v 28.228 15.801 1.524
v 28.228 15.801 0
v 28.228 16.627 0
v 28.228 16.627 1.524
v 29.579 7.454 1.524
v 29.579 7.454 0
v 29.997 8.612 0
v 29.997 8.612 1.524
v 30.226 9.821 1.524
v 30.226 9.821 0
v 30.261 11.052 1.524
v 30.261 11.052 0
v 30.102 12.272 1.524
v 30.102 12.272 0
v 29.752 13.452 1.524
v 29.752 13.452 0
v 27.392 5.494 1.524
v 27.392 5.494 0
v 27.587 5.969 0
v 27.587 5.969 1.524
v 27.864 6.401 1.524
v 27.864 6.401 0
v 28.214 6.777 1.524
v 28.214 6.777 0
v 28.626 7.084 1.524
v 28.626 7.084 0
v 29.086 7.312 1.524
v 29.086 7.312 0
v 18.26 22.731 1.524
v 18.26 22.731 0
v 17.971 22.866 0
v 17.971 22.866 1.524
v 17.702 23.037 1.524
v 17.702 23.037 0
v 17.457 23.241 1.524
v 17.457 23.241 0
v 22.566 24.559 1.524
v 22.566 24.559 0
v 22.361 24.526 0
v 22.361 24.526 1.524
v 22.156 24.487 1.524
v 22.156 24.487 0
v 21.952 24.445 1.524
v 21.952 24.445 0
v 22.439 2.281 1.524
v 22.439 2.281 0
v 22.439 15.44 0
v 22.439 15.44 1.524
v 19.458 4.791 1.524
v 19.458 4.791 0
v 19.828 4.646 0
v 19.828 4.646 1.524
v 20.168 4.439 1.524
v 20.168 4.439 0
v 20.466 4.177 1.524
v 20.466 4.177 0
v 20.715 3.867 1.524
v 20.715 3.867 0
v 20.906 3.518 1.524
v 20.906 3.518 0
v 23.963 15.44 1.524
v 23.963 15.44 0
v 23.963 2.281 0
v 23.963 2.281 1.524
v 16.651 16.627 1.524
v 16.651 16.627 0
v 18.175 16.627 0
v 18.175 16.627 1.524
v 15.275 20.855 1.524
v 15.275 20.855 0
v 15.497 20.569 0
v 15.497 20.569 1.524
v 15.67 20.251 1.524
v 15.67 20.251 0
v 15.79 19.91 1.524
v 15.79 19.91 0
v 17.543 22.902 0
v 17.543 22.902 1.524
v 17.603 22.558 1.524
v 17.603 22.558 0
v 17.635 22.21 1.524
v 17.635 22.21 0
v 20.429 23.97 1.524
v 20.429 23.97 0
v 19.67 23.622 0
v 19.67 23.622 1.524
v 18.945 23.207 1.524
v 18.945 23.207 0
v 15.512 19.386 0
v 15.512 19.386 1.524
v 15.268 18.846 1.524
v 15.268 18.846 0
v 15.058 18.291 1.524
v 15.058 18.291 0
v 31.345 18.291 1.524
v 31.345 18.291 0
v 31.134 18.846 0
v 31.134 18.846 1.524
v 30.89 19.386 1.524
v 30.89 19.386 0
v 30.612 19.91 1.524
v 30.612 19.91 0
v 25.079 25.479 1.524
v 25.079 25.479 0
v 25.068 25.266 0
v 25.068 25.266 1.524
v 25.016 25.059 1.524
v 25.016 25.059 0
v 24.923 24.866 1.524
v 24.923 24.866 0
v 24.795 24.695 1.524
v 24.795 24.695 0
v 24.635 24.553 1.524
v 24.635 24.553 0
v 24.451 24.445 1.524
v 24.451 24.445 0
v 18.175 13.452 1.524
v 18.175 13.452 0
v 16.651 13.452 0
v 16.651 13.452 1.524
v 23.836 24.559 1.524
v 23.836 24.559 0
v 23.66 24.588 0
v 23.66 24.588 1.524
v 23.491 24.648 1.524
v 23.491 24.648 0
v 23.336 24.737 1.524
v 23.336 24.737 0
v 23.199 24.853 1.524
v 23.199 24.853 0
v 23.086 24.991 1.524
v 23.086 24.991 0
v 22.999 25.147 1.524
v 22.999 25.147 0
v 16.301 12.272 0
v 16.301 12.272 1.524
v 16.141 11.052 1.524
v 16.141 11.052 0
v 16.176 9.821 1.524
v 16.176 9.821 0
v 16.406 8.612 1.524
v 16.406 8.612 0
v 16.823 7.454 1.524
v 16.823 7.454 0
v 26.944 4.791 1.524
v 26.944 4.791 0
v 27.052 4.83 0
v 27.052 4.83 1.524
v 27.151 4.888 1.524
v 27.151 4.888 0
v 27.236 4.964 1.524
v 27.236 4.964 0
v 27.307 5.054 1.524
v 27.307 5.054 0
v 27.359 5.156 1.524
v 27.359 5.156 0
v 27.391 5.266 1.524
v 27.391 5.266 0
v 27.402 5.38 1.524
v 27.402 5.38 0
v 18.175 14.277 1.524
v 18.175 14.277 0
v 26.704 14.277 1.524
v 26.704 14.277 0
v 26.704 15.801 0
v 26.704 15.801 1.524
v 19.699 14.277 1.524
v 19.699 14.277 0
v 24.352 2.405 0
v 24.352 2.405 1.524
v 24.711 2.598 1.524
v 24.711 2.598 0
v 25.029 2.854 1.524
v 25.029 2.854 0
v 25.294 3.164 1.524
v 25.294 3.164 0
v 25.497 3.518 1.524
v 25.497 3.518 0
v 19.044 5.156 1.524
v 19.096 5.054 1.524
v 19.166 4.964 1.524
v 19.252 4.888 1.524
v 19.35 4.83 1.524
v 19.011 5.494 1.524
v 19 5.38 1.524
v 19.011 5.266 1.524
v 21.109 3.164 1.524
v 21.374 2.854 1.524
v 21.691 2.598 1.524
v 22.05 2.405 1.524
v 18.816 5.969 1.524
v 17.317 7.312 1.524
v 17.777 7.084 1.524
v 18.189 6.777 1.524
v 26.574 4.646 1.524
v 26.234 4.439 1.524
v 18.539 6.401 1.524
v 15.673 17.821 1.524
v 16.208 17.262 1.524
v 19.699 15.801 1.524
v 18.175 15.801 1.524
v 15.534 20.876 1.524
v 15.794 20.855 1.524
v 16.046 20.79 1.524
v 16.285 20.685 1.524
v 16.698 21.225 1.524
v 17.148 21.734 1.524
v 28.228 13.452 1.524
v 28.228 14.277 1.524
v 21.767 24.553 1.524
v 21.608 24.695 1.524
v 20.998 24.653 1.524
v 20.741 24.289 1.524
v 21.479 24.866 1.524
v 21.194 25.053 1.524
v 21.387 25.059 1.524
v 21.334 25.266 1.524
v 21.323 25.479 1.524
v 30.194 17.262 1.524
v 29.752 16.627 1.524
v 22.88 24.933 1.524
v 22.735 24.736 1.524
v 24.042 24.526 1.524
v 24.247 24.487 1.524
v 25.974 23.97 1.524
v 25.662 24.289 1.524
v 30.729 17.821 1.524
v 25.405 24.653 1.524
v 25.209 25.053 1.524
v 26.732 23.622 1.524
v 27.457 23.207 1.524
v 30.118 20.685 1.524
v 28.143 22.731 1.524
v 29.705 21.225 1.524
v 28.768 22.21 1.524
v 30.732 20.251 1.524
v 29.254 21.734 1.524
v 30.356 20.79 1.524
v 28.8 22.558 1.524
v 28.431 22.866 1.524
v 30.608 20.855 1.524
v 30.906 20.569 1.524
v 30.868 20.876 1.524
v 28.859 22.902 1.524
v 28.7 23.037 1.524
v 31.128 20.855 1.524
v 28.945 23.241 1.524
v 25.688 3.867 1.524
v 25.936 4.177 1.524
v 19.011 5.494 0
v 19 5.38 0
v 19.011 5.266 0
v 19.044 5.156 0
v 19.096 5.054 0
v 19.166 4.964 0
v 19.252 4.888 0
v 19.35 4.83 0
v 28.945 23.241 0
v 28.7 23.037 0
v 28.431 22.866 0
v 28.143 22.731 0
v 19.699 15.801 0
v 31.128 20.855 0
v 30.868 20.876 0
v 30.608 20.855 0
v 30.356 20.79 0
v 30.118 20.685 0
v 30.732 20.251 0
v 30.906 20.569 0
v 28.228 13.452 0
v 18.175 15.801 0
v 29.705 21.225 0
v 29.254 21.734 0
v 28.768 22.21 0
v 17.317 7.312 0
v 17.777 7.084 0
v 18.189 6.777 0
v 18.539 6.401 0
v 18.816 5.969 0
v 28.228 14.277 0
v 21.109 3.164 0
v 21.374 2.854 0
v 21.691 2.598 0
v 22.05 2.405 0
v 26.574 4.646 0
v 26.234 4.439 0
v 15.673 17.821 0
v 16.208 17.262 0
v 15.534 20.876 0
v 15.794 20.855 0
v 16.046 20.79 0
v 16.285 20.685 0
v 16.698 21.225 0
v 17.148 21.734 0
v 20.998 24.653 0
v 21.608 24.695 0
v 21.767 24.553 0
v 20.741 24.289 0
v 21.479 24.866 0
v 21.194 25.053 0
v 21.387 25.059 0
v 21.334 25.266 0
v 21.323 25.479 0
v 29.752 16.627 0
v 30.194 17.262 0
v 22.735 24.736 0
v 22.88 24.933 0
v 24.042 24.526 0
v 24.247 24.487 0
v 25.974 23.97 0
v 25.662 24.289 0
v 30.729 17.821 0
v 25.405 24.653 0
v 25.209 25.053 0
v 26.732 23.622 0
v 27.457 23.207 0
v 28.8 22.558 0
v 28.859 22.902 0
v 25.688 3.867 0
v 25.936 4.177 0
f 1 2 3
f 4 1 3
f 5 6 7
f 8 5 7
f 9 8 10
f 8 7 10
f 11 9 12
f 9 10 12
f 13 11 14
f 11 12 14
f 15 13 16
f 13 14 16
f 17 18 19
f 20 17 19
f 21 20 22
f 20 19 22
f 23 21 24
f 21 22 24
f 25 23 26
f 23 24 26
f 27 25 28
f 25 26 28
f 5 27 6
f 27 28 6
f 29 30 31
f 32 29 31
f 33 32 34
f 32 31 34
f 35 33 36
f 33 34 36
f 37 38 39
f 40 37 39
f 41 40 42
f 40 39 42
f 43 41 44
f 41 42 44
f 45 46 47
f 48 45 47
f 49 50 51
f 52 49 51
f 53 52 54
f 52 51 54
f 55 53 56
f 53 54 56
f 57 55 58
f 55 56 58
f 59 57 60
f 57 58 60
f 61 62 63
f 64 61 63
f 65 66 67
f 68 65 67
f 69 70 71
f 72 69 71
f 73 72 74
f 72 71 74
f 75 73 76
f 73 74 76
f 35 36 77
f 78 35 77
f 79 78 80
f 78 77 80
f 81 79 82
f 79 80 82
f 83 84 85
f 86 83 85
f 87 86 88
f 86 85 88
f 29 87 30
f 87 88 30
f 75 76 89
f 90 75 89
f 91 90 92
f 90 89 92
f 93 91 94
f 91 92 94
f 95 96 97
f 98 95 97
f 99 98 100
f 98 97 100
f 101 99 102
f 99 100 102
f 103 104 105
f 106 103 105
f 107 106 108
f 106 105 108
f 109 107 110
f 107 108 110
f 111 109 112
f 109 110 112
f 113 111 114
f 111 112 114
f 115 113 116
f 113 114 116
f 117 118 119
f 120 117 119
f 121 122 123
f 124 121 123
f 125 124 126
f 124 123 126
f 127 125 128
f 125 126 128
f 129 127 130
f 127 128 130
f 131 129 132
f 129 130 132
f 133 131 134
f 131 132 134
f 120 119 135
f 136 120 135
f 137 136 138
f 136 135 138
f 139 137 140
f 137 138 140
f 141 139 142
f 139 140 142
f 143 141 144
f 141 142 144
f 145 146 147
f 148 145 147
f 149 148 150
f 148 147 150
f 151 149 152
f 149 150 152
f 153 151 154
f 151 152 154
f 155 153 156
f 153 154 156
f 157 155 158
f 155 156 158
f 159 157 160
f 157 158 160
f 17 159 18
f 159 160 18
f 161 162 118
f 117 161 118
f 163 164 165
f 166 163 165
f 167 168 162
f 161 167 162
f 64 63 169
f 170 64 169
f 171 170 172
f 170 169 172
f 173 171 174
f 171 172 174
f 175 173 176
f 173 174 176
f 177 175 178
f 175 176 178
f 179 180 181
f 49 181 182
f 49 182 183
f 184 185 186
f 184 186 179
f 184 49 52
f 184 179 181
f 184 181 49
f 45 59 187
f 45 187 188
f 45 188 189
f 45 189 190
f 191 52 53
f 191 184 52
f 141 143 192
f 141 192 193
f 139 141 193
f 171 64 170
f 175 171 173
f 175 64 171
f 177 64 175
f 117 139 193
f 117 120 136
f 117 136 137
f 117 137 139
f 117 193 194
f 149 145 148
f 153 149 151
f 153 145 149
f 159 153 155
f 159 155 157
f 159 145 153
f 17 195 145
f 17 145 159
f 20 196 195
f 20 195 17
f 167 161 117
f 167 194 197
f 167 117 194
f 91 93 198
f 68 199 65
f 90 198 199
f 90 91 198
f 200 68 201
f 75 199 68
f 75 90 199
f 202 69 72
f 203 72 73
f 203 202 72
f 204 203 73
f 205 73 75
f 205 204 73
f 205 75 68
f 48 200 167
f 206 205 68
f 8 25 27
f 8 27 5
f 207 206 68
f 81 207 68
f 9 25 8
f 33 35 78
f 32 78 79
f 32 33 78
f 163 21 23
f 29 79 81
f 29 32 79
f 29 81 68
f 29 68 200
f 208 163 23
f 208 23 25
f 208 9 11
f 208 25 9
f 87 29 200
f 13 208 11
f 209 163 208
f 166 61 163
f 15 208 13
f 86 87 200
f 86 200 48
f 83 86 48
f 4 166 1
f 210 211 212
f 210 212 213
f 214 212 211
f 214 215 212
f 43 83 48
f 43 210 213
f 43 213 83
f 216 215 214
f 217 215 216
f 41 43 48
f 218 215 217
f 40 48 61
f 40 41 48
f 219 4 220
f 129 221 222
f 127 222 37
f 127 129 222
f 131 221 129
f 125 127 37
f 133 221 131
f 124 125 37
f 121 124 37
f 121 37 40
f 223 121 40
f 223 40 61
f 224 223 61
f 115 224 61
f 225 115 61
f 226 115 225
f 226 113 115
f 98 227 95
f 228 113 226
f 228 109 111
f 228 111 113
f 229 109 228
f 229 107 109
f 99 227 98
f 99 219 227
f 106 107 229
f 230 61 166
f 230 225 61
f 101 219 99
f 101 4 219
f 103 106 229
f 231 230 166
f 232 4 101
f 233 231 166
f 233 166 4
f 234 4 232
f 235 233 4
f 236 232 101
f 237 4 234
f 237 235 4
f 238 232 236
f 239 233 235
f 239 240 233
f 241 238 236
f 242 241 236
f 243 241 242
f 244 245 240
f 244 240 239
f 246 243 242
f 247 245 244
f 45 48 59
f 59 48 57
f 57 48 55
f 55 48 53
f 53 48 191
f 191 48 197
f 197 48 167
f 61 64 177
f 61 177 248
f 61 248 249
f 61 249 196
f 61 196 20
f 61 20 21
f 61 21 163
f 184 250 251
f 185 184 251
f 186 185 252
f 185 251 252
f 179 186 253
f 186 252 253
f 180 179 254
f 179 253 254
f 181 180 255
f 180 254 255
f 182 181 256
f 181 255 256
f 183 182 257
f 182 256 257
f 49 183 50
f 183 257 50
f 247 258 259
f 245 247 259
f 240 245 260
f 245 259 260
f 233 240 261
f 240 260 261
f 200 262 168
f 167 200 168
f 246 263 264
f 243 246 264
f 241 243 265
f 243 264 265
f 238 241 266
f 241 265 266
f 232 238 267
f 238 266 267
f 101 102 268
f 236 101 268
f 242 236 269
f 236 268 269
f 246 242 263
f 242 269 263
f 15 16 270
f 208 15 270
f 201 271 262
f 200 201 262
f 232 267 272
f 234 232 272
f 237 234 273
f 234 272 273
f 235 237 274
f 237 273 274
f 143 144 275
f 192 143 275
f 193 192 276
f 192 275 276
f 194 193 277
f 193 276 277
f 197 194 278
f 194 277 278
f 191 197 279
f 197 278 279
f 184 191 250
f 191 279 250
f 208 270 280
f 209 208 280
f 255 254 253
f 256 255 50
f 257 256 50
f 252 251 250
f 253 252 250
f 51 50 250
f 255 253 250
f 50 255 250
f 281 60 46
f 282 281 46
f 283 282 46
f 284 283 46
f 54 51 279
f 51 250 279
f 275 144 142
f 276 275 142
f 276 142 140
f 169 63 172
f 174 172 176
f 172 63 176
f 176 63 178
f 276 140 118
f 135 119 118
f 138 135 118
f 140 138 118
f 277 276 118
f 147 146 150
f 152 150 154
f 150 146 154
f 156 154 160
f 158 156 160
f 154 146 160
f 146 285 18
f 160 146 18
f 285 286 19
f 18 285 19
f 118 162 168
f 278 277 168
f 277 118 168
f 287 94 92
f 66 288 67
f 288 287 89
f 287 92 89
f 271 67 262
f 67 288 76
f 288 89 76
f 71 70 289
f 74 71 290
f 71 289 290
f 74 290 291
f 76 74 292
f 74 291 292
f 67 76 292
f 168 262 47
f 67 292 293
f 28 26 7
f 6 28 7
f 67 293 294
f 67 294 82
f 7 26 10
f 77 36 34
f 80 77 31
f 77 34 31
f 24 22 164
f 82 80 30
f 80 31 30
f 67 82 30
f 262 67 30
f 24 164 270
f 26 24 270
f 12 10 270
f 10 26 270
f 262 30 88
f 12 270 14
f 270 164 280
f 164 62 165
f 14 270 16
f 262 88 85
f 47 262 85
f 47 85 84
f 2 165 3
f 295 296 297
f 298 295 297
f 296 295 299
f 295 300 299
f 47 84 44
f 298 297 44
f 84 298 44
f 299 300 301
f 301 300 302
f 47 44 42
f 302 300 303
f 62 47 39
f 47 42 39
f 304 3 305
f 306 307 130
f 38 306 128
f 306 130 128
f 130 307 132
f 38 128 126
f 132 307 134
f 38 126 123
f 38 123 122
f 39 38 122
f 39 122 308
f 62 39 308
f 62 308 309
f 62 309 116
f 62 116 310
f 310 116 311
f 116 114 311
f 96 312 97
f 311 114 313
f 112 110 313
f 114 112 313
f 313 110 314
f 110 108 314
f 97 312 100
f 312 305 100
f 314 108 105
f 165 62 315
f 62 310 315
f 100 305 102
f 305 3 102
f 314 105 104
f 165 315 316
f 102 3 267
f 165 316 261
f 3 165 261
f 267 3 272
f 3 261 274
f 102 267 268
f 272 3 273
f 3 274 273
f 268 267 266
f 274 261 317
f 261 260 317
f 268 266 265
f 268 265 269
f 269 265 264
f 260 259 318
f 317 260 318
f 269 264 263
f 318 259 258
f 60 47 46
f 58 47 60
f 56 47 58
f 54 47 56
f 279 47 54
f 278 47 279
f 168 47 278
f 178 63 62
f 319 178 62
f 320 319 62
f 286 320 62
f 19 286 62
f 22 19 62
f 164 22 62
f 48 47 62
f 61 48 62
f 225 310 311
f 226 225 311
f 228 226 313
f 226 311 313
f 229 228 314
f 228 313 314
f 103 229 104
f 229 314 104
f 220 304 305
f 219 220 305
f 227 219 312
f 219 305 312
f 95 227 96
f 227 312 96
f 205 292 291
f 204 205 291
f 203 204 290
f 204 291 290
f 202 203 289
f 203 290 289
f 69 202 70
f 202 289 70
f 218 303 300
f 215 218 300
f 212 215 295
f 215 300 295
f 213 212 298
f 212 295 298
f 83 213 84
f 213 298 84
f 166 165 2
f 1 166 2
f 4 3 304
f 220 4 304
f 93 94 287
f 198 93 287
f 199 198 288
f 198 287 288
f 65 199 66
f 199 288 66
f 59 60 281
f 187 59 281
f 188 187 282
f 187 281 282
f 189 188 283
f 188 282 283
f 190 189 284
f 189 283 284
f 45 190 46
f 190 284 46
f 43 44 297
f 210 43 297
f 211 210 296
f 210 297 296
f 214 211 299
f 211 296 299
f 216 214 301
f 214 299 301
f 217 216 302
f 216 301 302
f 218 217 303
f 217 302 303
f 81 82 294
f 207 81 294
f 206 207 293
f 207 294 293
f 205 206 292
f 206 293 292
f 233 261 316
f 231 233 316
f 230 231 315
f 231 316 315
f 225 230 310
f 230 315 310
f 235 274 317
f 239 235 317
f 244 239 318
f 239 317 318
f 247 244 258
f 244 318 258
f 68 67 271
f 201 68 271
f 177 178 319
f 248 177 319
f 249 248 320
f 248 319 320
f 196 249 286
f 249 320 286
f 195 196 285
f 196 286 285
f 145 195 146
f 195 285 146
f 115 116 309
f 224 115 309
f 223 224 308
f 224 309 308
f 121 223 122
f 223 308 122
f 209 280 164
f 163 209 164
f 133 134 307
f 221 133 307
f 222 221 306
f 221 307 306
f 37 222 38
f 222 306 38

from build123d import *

# Parameters (mm, degrees)
BOSS_EXTRUDE2_DEPTH = 1.524


with BuildPart() as part:
    # Sketch1 → Boss-Extrude2 (new body)
    with BuildSketch(Plane.XY):
        with BuildLine():
            Line((22.439190696, 2.281072115), (22.439190696, 15.440411119))
            Line((22.439190696, 15.440411119), (23.963190696, 15.440411119))
            Line((23.963190696, 15.440411119), (23.963190696, 2.281072115))
            ThreePointArc((23.963190696, 2.281072115), (24.875976359, 2.718444333), (25.496797873, 3.517852096))
            ThreePointArc((25.496797873, 3.517852096), (26.079485641, 4.314676532), (26.944327918, 4.790598847))
            ThreePointArc((26.944327918, 4.790598847), (27.306638474, 5.053990144), (27.391790825, 5.493754843))
            ThreePointArc((27.391790825, 5.493754843), (28.213802596, 6.77713145), (29.579242724, 7.454133758))
            ThreePointArc((29.579242724, 7.454133758), (30.268025744, 10.435749579), (29.751585716, 13.451996362))
            Line((29.751585716, 13.451996362), (28.227585716, 13.451996362))
            Line((28.227585716, 13.451996362), (28.227585716, 14.277496362))
            Line((28.227585716, 14.277496362), (26.703585716, 14.277496362))
            Line((26.703585716, 14.277496362), (26.703585716, 15.801496362))
            Line((26.703585716, 15.801496362), (28.227585716, 15.801496362))
            Line((28.227585716, 15.801496362), (28.227585716, 16.626996362))
            Line((28.227585716, 16.626996362), (29.751585716, 16.626996362))
            ThreePointArc((29.751585716, 16.626996362), (30.450938942, 17.551968079), (31.344559642, 18.290960401))
            ThreePointArc((31.344559642, 18.290960401), (31.016414864, 19.117764263), (30.611916517, 19.910017196))
            ThreePointArc((30.611916517, 19.910017196), (30.812764797, 20.413642259), (31.127845897, 20.854892911))
            ThreePointArc((31.127845897, 20.854892911), (30.608483418, 20.85451221), (30.117641351, 20.684772426))
            ThreePointArc((30.117641351, 20.684772426), (29.483865735, 21.483760637), (28.767611914, 22.209731818))
            ThreePointArc((28.767611914, 22.209731818), (28.825967468, 22.730638245), (28.945134545, 23.241077355))
            ThreePointArc((28.945134545, 23.241077355), (28.568640605, 22.947137357), (28.142874774, 22.730638245))
            ThreePointArc((28.142874774, 22.730638245), (27.099472832, 23.422587859), (25.973692104, 23.970401362))
            ThreePointArc((25.973692104, 23.970401362), (25.40453187, 24.652580061), (25.079145794, 25.479281369))
            ThreePointArc((25.079145794, 25.479281369), (24.923162133, 24.865841557), (24.450537029, 24.444813273))
            ThreePointArc((24.450537029, 24.444813273), (24.144286047, 24.507151138), (23.836139674, 24.559319007))
            ThreePointArc((23.836139674, 24.559319007), (23.336074732, 24.737274916), (22.998556028, 25.146926447))
            ThreePointArc((22.998556028, 25.146926447), (22.81061569, 24.832363061), (22.566241718, 24.559319007))
            ThreePointArc((22.566241718, 24.559319007), (22.258095346, 24.507151138), (21.951844363, 24.444813273))
            ThreePointArc((21.951844363, 24.444813273), (21.47921926, 24.865841557), (21.323235599, 25.479281369))
            ThreePointArc((21.323235599, 25.479281369), (20.997849523, 24.652580061), (20.428689288, 23.970401362))
            ThreePointArc((20.428689288, 23.970401362), (19.302908561, 23.422587859), (18.259506619, 22.730638245))
            ThreePointArc((18.259506619, 22.730638245), (17.833740787, 22.947137357), (17.457246848, 23.241077355))
            ThreePointArc((17.457246848, 23.241077355), (17.576413925, 22.730638245), (17.634769478, 22.209731818))
            ThreePointArc((17.634769478, 22.209731818), (16.918515657, 21.483760637), (16.284740042, 20.684772426))
            ThreePointArc((16.284740042, 20.684772426), (15.793897974, 20.85451221), (15.274535496, 20.854892911))
            ThreePointArc((15.274535496, 20.854892911), (15.589616595, 20.413642259), (15.790464876, 19.910017196))
            ThreePointArc((15.790464876, 19.910017196), (15.385966529, 19.117764263), (15.05782175, 18.290960401))
            ThreePointArc((15.05782175, 18.290960401), (15.951442451, 17.551968079), (16.650795677, 16.626996362))
            Line((16.650795677, 16.626996362), (18.174795677, 16.626996362))
            Line((18.174795677, 16.626996362), (18.174795677, 15.801496362))
            Line((18.174795677, 15.801496362), (19.698795677, 15.801496362))
            Line((19.698795677, 15.801496362), (19.698795677, 14.277496362))
            Line((19.698795677, 14.277496362), (18.174795677, 14.277496362))
            Line((18.174795677, 14.277496362), (18.174795677, 13.451996362))
            Line((18.174795677, 13.451996362), (16.650795677, 13.451996362))
            ThreePointArc((16.650795677, 13.451996362), (16.134355649, 10.435749579), (16.823138669, 7.454133758))
            ThreePointArc((16.823138669, 7.454133758), (18.188578797, 6.77713145), (19.010590568, 5.493754843))
            ThreePointArc((19.010590568, 5.493754843), (19.095742919, 5.053990144), (19.458053474, 4.790598847))
            ThreePointArc((19.458053474, 4.790598847), (20.322895752, 4.314676532), (20.905583519, 3.517852096))
            ThreePointArc((20.905583519, 3.517852096), (21.526405033, 2.718444333), (22.439190696, 2.281072115))
        make_face()
    extrude(amount=BOSS_EXTRUDE2_DEPTH)


solid = part.part
